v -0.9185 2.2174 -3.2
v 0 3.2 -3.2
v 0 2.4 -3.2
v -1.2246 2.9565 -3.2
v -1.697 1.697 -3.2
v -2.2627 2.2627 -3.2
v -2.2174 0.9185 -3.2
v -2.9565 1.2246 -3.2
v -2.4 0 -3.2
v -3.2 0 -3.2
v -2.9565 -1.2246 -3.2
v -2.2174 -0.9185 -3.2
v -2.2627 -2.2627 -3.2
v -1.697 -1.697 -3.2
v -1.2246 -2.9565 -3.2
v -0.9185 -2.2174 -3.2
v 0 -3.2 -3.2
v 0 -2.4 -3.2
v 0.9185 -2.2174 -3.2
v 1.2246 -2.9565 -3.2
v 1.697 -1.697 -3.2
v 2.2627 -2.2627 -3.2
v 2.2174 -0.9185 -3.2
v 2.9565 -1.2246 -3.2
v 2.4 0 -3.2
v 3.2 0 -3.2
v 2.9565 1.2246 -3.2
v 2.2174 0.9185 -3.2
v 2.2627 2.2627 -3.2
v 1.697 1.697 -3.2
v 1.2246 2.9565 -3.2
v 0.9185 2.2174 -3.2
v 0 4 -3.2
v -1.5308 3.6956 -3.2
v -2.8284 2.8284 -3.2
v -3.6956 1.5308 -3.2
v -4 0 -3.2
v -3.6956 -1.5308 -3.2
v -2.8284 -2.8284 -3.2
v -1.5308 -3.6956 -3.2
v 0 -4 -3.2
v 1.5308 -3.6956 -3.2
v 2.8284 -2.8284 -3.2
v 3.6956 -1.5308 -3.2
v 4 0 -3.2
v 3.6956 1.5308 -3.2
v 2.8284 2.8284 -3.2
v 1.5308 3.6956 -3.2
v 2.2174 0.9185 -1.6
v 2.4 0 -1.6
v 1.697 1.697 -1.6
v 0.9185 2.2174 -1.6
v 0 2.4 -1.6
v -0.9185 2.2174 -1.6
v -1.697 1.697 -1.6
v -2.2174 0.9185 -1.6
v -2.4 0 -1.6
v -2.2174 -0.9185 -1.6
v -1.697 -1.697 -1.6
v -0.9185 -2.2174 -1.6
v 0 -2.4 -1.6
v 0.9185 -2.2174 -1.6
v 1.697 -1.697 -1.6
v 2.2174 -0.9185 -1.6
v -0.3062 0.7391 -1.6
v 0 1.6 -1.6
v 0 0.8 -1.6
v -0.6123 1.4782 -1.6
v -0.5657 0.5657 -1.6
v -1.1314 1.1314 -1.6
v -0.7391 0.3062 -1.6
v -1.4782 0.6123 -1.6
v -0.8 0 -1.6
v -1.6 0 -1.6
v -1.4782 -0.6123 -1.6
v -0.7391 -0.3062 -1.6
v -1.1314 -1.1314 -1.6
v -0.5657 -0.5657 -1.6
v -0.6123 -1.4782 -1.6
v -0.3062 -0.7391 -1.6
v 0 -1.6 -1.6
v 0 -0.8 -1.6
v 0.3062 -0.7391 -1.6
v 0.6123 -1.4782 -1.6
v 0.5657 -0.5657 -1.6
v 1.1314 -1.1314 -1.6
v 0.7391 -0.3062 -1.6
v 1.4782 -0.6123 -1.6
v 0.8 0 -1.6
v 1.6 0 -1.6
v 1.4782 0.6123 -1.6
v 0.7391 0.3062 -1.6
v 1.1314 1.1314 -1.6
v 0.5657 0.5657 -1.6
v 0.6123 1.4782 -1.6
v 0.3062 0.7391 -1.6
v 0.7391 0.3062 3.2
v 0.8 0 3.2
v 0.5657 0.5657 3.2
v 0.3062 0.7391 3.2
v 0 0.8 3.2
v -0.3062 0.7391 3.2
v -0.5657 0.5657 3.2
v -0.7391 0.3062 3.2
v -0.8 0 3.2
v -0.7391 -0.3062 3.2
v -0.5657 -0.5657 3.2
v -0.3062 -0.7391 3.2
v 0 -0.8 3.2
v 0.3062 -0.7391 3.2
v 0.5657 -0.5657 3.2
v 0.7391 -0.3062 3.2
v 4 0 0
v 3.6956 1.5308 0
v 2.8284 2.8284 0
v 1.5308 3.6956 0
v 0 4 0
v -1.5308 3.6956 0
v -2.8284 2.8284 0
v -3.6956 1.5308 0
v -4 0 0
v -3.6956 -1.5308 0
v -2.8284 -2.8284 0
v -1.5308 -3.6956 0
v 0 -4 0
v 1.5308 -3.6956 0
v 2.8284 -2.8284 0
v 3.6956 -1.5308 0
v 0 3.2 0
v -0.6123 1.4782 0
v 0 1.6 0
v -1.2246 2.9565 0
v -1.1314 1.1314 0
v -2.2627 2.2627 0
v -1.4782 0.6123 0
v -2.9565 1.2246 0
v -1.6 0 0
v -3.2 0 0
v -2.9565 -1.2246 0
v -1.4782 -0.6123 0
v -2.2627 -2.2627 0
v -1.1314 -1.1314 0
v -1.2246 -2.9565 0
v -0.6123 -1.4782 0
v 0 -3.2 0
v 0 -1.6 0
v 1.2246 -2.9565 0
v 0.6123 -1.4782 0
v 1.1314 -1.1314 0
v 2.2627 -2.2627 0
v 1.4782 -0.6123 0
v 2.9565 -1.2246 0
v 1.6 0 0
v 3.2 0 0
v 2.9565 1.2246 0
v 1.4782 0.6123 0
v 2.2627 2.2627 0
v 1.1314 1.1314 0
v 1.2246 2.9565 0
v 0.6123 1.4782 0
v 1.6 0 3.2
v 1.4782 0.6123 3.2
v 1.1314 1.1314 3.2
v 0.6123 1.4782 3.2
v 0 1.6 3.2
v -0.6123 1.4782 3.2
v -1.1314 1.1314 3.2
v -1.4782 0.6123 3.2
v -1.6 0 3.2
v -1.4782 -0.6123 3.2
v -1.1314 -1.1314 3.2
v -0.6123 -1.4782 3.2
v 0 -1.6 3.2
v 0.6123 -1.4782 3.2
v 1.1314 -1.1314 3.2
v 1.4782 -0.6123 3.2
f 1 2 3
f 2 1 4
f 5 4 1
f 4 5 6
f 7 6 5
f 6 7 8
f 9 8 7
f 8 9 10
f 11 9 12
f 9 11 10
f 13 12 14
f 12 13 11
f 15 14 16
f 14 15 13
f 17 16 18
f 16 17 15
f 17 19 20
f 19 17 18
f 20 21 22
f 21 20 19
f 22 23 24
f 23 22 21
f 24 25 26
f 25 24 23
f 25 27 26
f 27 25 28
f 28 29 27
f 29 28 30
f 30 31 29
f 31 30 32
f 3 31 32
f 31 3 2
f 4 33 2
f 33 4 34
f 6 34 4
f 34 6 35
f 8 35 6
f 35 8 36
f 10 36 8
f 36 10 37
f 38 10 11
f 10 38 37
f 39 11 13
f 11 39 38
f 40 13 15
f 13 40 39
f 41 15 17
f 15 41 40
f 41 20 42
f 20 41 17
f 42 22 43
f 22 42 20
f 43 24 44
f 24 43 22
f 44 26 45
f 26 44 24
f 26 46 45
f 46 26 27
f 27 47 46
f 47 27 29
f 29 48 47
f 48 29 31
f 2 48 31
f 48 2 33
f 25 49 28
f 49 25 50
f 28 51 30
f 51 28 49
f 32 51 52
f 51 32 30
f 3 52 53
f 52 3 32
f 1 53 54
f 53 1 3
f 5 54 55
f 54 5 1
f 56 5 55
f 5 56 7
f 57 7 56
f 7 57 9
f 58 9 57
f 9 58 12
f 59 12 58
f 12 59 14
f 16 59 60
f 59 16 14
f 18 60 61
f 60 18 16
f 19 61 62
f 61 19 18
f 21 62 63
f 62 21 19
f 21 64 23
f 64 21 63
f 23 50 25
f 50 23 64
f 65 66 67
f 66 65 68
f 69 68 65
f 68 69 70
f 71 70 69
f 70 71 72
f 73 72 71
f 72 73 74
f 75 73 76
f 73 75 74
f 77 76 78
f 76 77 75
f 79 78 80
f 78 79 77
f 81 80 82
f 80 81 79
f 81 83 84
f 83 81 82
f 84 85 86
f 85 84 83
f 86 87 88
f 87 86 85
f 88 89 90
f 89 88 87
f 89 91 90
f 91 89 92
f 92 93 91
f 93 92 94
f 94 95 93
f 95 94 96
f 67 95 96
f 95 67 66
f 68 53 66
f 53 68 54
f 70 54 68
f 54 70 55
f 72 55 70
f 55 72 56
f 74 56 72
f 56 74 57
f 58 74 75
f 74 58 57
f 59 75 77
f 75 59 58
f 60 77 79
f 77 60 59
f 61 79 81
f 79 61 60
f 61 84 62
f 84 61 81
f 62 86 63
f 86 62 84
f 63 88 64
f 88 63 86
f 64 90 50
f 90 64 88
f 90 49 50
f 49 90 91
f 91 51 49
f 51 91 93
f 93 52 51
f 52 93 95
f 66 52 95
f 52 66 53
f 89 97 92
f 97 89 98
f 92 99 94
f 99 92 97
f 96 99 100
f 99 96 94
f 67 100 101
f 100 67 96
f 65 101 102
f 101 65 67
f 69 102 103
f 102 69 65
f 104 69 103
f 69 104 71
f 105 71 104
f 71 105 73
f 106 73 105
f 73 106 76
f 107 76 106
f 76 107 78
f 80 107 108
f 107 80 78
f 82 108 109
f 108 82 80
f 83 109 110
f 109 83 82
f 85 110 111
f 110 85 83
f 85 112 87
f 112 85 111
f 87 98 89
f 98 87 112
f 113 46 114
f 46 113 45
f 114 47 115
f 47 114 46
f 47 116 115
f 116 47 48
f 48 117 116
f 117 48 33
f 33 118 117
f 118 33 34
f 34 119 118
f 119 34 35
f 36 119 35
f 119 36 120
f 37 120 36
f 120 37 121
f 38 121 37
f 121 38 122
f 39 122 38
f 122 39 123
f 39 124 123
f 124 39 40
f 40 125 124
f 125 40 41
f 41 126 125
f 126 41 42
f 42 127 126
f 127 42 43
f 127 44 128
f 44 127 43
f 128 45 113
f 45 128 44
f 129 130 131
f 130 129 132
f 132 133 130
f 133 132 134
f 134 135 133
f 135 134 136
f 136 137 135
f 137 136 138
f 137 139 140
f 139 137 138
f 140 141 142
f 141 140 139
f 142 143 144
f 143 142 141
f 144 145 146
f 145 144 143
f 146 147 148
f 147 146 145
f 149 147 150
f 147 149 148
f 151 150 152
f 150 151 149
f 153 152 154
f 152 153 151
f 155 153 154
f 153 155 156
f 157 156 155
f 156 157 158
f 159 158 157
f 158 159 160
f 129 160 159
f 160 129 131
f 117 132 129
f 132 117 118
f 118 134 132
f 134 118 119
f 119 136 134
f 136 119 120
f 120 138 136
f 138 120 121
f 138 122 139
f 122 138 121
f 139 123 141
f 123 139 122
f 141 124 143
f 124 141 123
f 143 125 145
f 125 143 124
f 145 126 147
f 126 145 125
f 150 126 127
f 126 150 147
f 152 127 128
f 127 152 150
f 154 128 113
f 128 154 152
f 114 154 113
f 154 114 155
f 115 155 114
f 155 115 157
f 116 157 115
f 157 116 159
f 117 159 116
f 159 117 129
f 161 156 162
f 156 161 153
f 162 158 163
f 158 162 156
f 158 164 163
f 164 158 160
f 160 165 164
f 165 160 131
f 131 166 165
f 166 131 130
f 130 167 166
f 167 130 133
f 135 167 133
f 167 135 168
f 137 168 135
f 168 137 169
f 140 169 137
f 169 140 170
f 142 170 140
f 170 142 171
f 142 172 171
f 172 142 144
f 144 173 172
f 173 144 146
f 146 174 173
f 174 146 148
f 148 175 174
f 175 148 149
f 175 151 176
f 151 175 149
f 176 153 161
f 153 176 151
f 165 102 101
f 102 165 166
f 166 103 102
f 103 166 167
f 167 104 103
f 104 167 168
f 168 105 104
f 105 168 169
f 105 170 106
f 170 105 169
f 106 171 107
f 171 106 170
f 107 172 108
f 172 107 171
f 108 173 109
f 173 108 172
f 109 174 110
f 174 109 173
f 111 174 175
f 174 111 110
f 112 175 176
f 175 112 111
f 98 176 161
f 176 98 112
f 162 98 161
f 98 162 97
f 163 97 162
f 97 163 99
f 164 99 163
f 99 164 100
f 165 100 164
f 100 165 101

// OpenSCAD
// file: ../p/4-4edge.scad
use <../lib.scad>
function ldraw_lib__4_4edge() = [
// 0 Circle 1.0
// 0 Name: 4-4edge.dat
// 0 Author: James Jessiman
// 0 !LDRAW_ORG Primitive UPDATE 2017-01
// 0 !LICENSE Licensed under CC BY 4.0 : see CAreadme.txt
// 
// 0 BFC CERTIFY CCW
  [0,"BFC","CERTIFY"],
  [0,"BFC","CCW"],
// 
// 0 !HISTORY 1998-12-15 [PTadmin] Official Update 1998-10
// 0 !HISTORY 2005-12-28 [PTadmin] Official Update 2005-01
// 0 !HISTORY 2007-06-24 [PTadmin] Header formatted for Contributor Agreement
// 0 !HISTORY 2008-07-01 [PTadmin] Official Update 2008-01
// 0 !HISTORY 2017-01-15 [Steffen] BFCed
// 0 !HISTORY 2017-12-30 [PTadmin] Official Update 2017-01
// 
// 
// 2 24 1 0 0 0.9239 0 0.3827
  [2,24,1,0,0,0.9239,0,0.3827],
// 2 24 0.9239 0 0.3827 0.7071 0 0.7071
  [2,24,0.9239,0,0.3827,0.7071,0,0.7071],
// 2 24 0.7071 0 0.7071 0.3827 0 0.9239
  [2,24,0.7071,0,0.7071,0.3827,0,0.9239],
// 2 24 0.3827 0 0.9239 0 0 1
  [2,24,0.3827,0,0.9239,0,0,1],
// 2 24 0 0 1 -0.3827 0 0.9239
  [2,24,0,0,1,-0.3827,0,0.9239],
// 2 24 -0.3827 0 0.9239 -0.7071 0 0.7071
  [2,24,-0.3827,0,0.9239,-0.7071,0,0.7071],
// 2 24 -0.7071 0 0.7071 -0.9239 0 0.3827
  [2,24,-0.7071,0,0.7071,-0.9239,0,0.3827],
// 2 24 -0.9239 0 0.3827 -1 0 -0
  [2,24,-0.9239,0,0.3827,-1,0,-0],
// 2 24 -1 0 -0 -0.9239 0 -0.3827
  [2,24,-1,0,-0,-0.9239,0,-0.3827],
// 2 24 -0.9239 0 -0.3827 -0.7071 0 -0.7071
  [2,24,-0.9239,0,-0.3827,-0.7071,0,-0.7071],
// 2 24 -0.7071 0 -0.7071 -0.3827 0 -0.9239
  [2,24,-0.7071,0,-0.7071,-0.3827,0,-0.9239],
// 2 24 -0.3827 0 -0.9239 0 0 -1
  [2,24,-0.3827,0,-0.9239,0,0,-1],
// 2 24 0 0 -1 0.3827 0 -0.9239
  [2,24,0,0,-1,0.3827,0,-0.9239],
// 2 24 0.3827 0 -0.9239 0.7071 0 -0.7071
  [2,24,0.3827,0,-0.9239,0.7071,0,-0.7071],
// 2 24 0.7071 0 -0.7071 0.9239 0 -0.3827
  [2,24,0.7071,0,-0.7071,0.9239,0,-0.3827],
// 2 24 0.9239 0 -0.3827 1 0 0
  [2,24,0.9239,0,-0.3827,1,0,0],
];
module ldraw_lib__4_4edge(step=0, col=false, unit=2/5, alt=false, line=0.2, solid=!$preview)
    makepoly(ldraw_lib__4_4edge(), step=step, col=col, unit=unit, alt=alt, line=line, solid=solid);
ldraw_lib__4_4edge(line=0.2);
// file: ../p/4-4cyli.scad
use <../lib.scad>
function ldraw_lib__4_4cyli() = [
// 0 Cylinder 1.0
// 0 Name: 4-4cyli.dat
// 0 Author: James Jessiman
// 0 !LDRAW_ORG Primitive UPDATE 2005-01
// 0 !LICENSE Licensed under CC BY 2.0 and CC BY 4.0 : see CAreadme.txt
// 
// 0 BFC CERTIFY CCW
  [0,"BFC","CERTIFY"],
  [0,"BFC","CCW"],
// 
// 0 !HISTORY 1998-12-15 [PTadmin] Official Update 1998-10
// 0 !HISTORY 2002-03-23 [sbliss] Added BFC statement; merged headers from files in distributions LDraw 0.27 and Complete.
// 0 !HISTORY 2002-04-25 [PTadmin] Official Update 2002-02
// 0 !HISTORY 2004-12-14 [guyvivan] BFC CCW
// 0 !HISTORY 2005-12-28 [PTadmin] Official Update 2005-01
// 0 !HISTORY 2007-06-24 [PTadmin] Header formatted for Contributor Agreement
// 0 !HISTORY 2008-07-01 [PTadmin] Official Update 2008-01
// 
// 
// 4 16 1 1 0 0.9239 1 0.3827 0.9239 0 0.3827 1 0 0
  [4,16,1,1,0,0.9239,1,0.3827,0.9239,0,0.3827,1,0,0],
// 5 24 1 0 0 1 1 0 0.9239 0 0.3827 0.9239 0 -0.3827
  [5,24,1,0,0,1,1,0,0.9239,0,0.3827,0.9239,0,-0.3827],
// 4 16 0.9239 1 0.3827 0.7071 1 0.7071 0.7071 0 0.7071 0.9239 0 0.3827
  [4,16,0.9239,1,0.3827,0.7071,1,0.7071,0.7071,0,0.7071,0.9239,0,0.3827],
// 5 24 0.9239 0 0.3827 0.9239 1 0.3827 0.7071 0 0.7071 1 0 0
  [5,24,0.9239,0,0.3827,0.9239,1,0.3827,0.7071,0,0.7071,1,0,0],
// 4 16 0.7071 1 0.7071 0.3827 1 0.9239 0.3827 0 0.9239 0.7071 0 0.7071
  [4,16,0.7071,1,0.7071,0.3827,1,0.9239,0.3827,0,0.9239,0.7071,0,0.7071],
// 5 24 0.7071 0 0.7071 0.7071 1 0.7071 0.3827 0 0.9239 0.9239 0 0.3827
  [5,24,0.7071,0,0.7071,0.7071,1,0.7071,0.3827,0,0.9239,0.9239,0,0.3827],
// 4 16 0.3827 1 0.9239 0 1 1 0 0 1 0.3827 0 0.9239
  [4,16,0.3827,1,0.9239,0,1,1,0,0,1,0.3827,0,0.9239],
// 5 24 0.3827 0 0.9239 0.3827 1 0.9239 0 0 1 0.7071 0 0.7071
  [5,24,0.3827,0,0.9239,0.3827,1,0.9239,0,0,1,0.7071,0,0.7071],
// 4 16 0 1 1 -0.3827 1 0.9239 -0.3827 0 0.9239 0 0 1
  [4,16,0,1,1,-0.3827,1,0.9239,-0.3827,0,0.9239,0,0,1],
// 5 24 0 0 1 0 1 1 -0.3827 0 0.9239 0.3827 0 0.9239
  [5,24,0,0,1,0,1,1,-0.3827,0,0.9239,0.3827,0,0.9239],
// 4 16 -0.3827 1 0.9239 -0.7071 1 0.7071 -0.7071 0 0.7071 -0.3827 0 0.9239
  [4,16,-0.3827,1,0.9239,-0.7071,1,0.7071,-0.7071,0,0.7071,-0.3827,0,0.9239],
// 5 24 -0.3827 0 0.9239 -0.3827 1 0.9239 -0.7071 0 0.7071 0 0 1
  [5,24,-0.3827,0,0.9239,-0.3827,1,0.9239,-0.7071,0,0.7071,0,0,1],
// 4 16 -0.7071 1 0.7071 -0.9239 1 0.3827 -0.9239 0 0.3827 -0.7071 0 0.7071
  [4,16,-0.7071,1,0.7071,-0.9239,1,0.3827,-0.9239,0,0.3827,-0.7071,0,0.7071],
// 5 24 -0.7071 0 0.7071 -0.7071 1 0.7071 -0.9239 0 0.3827 -0.3827 0 0.9239
  [5,24,-0.7071,0,0.7071,-0.7071,1,0.7071,-0.9239,0,0.3827,-0.3827,0,0.9239],
// 4 16 -0.9239 1 0.3827 -1 1 0 -1 0 0 -0.9239 0 0.3827
  [4,16,-0.9239,1,0.3827,-1,1,0,-1,0,0,-0.9239,0,0.3827],
// 5 24 -0.9239 0 0.3827 -0.9239 1 0.3827 -1 0 0 -0.7071 0 0.7071
  [5,24,-0.9239,0,0.3827,-0.9239,1,0.3827,-1,0,0,-0.7071,0,0.7071],
// 4 16 -1 1 0 -0.9239 1 -0.3827 -0.9239 0 -0.3827 -1 0 0
  [4,16,-1,1,0,-0.9239,1,-0.3827,-0.9239,0,-0.3827,-1,0,0],
// 5 24 -1 0 0 -1 1 0 -0.9239 0 -0.3827 -0.9239 0 0.3827
  [5,24,-1,0,0,-1,1,0,-0.9239,0,-0.3827,-0.9239,0,0.3827],
// 4 16 -0.9239 1 -0.3827 -0.7071 1 -0.7071 -0.7071 0 -0.7071 -0.9239 0 -0.3827
  [4,16,-0.9239,1,-0.3827,-0.7071,1,-0.7071,-0.7071,0,-0.7071,-0.9239,0,-0.3827],
// 5 24 -0.9239 0 -0.3827 -0.9239 1 -0.3827 -0.7071 0 -0.7071 -1 0 0
  [5,24,-0.9239,0,-0.3827,-0.9239,1,-0.3827,-0.7071,0,-0.7071,-1,0,0],
// 4 16 -0.7071 1 -0.7071 -0.3827 1 -0.9239 -0.3827 0 -0.9239 -0.7071 0 -0.7071
  [4,16,-0.7071,1,-0.7071,-0.3827,1,-0.9239,-0.3827,0,-0.9239,-0.7071,0,-0.7071],
// 5 24 -0.7071 0 -0.7071 -0.7071 1 -0.7071 -0.3827 0 -0.9239 -0.9239 0 -0.3827
  [5,24,-0.7071,0,-0.7071,-0.7071,1,-0.7071,-0.3827,0,-0.9239,-0.9239,0,-0.3827],
// 4 16 -0.3827 1 -0.9239 0 1 -1 0 0 -1 -0.3827 0 -0.9239
  [4,16,-0.3827,1,-0.9239,0,1,-1,0,0,-1,-0.3827,0,-0.9239],
// 5 24 -0.3827 0 -0.9239 -0.3827 1 -0.9239 0 0 -1 -0.7071 0 -0.7071
  [5,24,-0.3827,0,-0.9239,-0.3827,1,-0.9239,0,0,-1,-0.7071,0,-0.7071],
// 4 16 0 1 -1 0.3827 1 -0.9239 0.3827 0 -0.9239 0 0 -1
  [4,16,0,1,-1,0.3827,1,-0.9239,0.3827,0,-0.9239,0,0,-1],
// 5 24 0 0 -1 0 1 -1 0.3827 0 -0.9239 -0.3827 0 -0.9239
  [5,24,0,0,-1,0,1,-1,0.3827,0,-0.9239,-0.3827,0,-0.9239],
// 4 16 0.3827 1 -0.9239 0.7071 1 -0.7071 0.7071 0 -0.7071 0.3827 0 -0.9239
  [4,16,0.3827,1,-0.9239,0.7071,1,-0.7071,0.7071,0,-0.7071,0.3827,0,-0.9239],
// 5 24 0.3827 0 -0.9239 0.3827 1 -0.9239 0.7071 0 -0.7071 0 0 -1
  [5,24,0.3827,0,-0.9239,0.3827,1,-0.9239,0.7071,0,-0.7071,0,0,-1],
// 4 16 0.7071 1 -0.7071 0.9239 1 -0.3827 0.9239 0 -0.3827 0.7071 0 -0.7071
  [4,16,0.7071,1,-0.7071,0.9239,1,-0.3827,0.9239,0,-0.3827,0.7071,0,-0.7071],
// 5 24 0.7071 0 -0.7071 0.7071 1 -0.7071 0.9239 0 -0.3827 0.3827 0 -0.9239
  [5,24,0.7071,0,-0.7071,0.7071,1,-0.7071,0.9239,0,-0.3827,0.3827,0,-0.9239],
// 4 16 0.9239 1 -0.3827 1 1 0 1 0 0 0.9239 0 -0.3827
  [4,16,0.9239,1,-0.3827,1,1,0,1,0,0,0.9239,0,-0.3827],
// 5 24 0.9239 0 -0.3827 0.9239 1 -0.3827 1 0 0 0.7071 0 -0.7071
  [5,24,0.9239,0,-0.3827,0.9239,1,-0.3827,1,0,0,0.7071,0,-0.7071],
// 0
];
module ldraw_lib__4_4cyli(step=0, col=false, unit=2/5, alt=false, line=0.2, solid=!$preview)
    makepoly(ldraw_lib__4_4cyli(), step=step, col=col, unit=unit, alt=alt, line=line, solid=solid);
ldraw_lib__4_4cyli(line=0.2);
// file: ../p/4-4ring4.scad
use <../lib.scad>
function ldraw_lib__4_4ring4() = [
// 0 Ring  4 x 1.0
// 0 Name: 4-4ring4.dat
// 0 Author: James Jessiman
// 0 !LDRAW_ORG Primitive UPDATE 2009-01
// 0 !LICENSE Licensed under CC BY 2.0 and CC BY 4.0 : see CAreadme.txt
// 
// 0 BFC CERTIFY CCW
  [0,"BFC","CERTIFY"],
  [0,"BFC","CCW"],
// 
// 0 !HISTORY 1998-12-15 [PTadmin] Official Update 1998-10
// 0 !HISTORY 2002-04-08 [BrickCaster] Modified for BFC compliance
// 0 !HISTORY 2002-04-25 [PTadmin] Official Update 2002-02
// 0 !HISTORY 2007-06-24 [PTadmin] Header formatted for Contributor Agreement
// 0 !HISTORY 2008-07-01 [PTadmin] Official Update 2008-01
// 0 !HISTORY 2008-08-26 [cwdee] Switch polygon winding and rename
// 0 !HISTORY 2009-05-02 [PTadmin] Official Update 2009-01
// 
// 
// 4 16 -1.9135 0 4.6195 -1.5308 0 3.6956 0 0 4 0 0 5
  [4,16,-1.9135,0,4.6195,-1.5308,0,3.6956,0,0,4,0,0,5],
// 4 16 -3.5355 0 3.5355 -2.8284 0 2.8284 -1.5308 0 3.6956 -1.9135 0 4.6195
  [4,16,-3.5355,0,3.5355,-2.8284,0,2.8284,-1.5308,0,3.6956,-1.9135,0,4.6195],
// 4 16 -4.6195 0 1.9135 -3.6956 0 1.5308 -2.8284 0 2.8284 -3.5355 0 3.5355
  [4,16,-4.6195,0,1.9135,-3.6956,0,1.5308,-2.8284,0,2.8284,-3.5355,0,3.5355],
// 4 16 -5 0 0 -4 0 0 -3.6956 0 1.5308 -4.6195 0 1.9135
  [4,16,-5,0,0,-4,0,0,-3.6956,0,1.5308,-4.6195,0,1.9135],
// 4 16 -4.6195 0 -1.9135 -3.6956 0 -1.5308 -4 0 0 -5 0 0
  [4,16,-4.6195,0,-1.9135,-3.6956,0,-1.5308,-4,0,0,-5,0,0],
// 4 16 -3.5355 0 -3.5355 -2.8284 0 -2.8284 -3.6956 0 -1.5308 -4.6195 0 -1.9135
  [4,16,-3.5355,0,-3.5355,-2.8284,0,-2.8284,-3.6956,0,-1.5308,-4.6195,0,-1.9135],
// 4 16 -1.9135 0 -4.6195 -1.5308 0 -3.6956 -2.8284 0 -2.8284 -3.5355 0 -3.5355
  [4,16,-1.9135,0,-4.6195,-1.5308,0,-3.6956,-2.8284,0,-2.8284,-3.5355,0,-3.5355],
// 4 16 0 0 -5 0 0 -4 -1.5308 0 -3.6956 -1.9135 0 -4.6195
  [4,16,0,0,-5,0,0,-4,-1.5308,0,-3.6956,-1.9135,0,-4.6195],
// 4 16 1.9135 0 -4.6195 1.5308 0 -3.6956 0 0 -4 0 0 -5
  [4,16,1.9135,0,-4.6195,1.5308,0,-3.6956,0,0,-4,0,0,-5],
// 4 16 3.5355 0 -3.5355 2.8284 0 -2.8284 1.5308 0 -3.6956 1.9135 0 -4.6195
  [4,16,3.5355,0,-3.5355,2.8284,0,-2.8284,1.5308,0,-3.6956,1.9135,0,-4.6195],
// 4 16 4.6195 0 -1.9135 3.6956 0 -1.5308 2.8284 0 -2.8284 3.5355 0 -3.5355
  [4,16,4.6195,0,-1.9135,3.6956,0,-1.5308,2.8284,0,-2.8284,3.5355,0,-3.5355],
// 4 16 5 0 0 4 0 0 3.6956 0 -1.5308 4.6195 0 -1.9135
  [4,16,5,0,0,4,0,0,3.6956,0,-1.5308,4.6195,0,-1.9135],
// 4 16 4.6195 0 1.9135 3.6956 0 1.5308 4 0 0 5 0 0
  [4,16,4.6195,0,1.9135,3.6956,0,1.5308,4,0,0,5,0,0],
// 4 16 3.5355 0 3.5355 2.8284 0 2.8284 3.6956 0 1.5308 4.6195 0 1.9135
  [4,16,3.5355,0,3.5355,2.8284,0,2.8284,3.6956,0,1.5308,4.6195,0,1.9135],
// 4 16 1.9135 0 4.6195 1.5308 0 3.6956 2.8284 0 2.8284 3.5355 0 3.5355
  [4,16,1.9135,0,4.6195,1.5308,0,3.6956,2.8284,0,2.8284,3.5355,0,3.5355],
// 4 16 0 0 5 0 0 4 1.5308 0 3.6956 1.9135 0 4.6195
  [4,16,0,0,5,0,0,4,1.5308,0,3.6956,1.9135,0,4.6195],
// 0
];
module ldraw_lib__4_4ring4(step=0, col=false, unit=2/5, alt=false, line=0.2, solid=!$preview)
    makepoly(ldraw_lib__4_4ring4(), step=step, col=col, unit=unit, alt=alt, line=line, solid=solid);
ldraw_lib__4_4ring4(line=0.2);
// file: ../p/4-4ring3.scad
use <../lib.scad>
function ldraw_lib__4_4ring3() = [
// 0 Ring  3 x 1.0
// 0 Name: 4-4ring3.dat
// 0 Author: James Jessiman
// 0 !LDRAW_ORG Primitive UPDATE 2009-01
// 0 !LICENSE Licensed under CC BY 2.0 and CC BY 4.0 : see CAreadme.txt
// 
// 0 BFC CERTIFY CCW
  [0,"BFC","CERTIFY"],
  [0,"BFC","CCW"],
// 
// 0 !HISTORY 1998-12-15 [PTadmin] Official Update 1998-10
// 0 !HISTORY 2002-04-05 [hafhead] Added BFC statement
// 0 !HISTORY 2002-04-25 [PTadmin] Official Update 2002-02
// 0 !HISTORY 2007-06-24 [PTadmin] Header formatted for Contributor Agreement
// 0 !HISTORY 2008-07-01 [PTadmin] Official Update 2008-01
// 0 !HISTORY 2008-08-26 [cwdee] Switch polygon winding and rename
// 0 !HISTORY 2009-05-02 [PTadmin] Official Update 2009-01
// 
// 
// 4 16 -1.5308 0 3.6956 -1.1481 0 2.7717 0 0 3 0 0 4
  [4,16,-1.5308,0,3.6956,-1.1481,0,2.7717,0,0,3,0,0,4],
// 4 16 -2.8284 0 2.8284 -2.1213 0 2.1213 -1.1481 0 2.7717 -1.5308 0 3.6956
  [4,16,-2.8284,0,2.8284,-2.1213,0,2.1213,-1.1481,0,2.7717,-1.5308,0,3.6956],
// 4 16 -3.6956 0 1.5308 -2.7717 0 1.1481 -2.1213 0 2.1213 -2.8284 0 2.8284
  [4,16,-3.6956,0,1.5308,-2.7717,0,1.1481,-2.1213,0,2.1213,-2.8284,0,2.8284],
// 4 16 -4 0 0 -3 0 0 -2.7717 0 1.1481 -3.6956 0 1.5308
  [4,16,-4,0,0,-3,0,0,-2.7717,0,1.1481,-3.6956,0,1.5308],
// 4 16 -3.6956 0 -1.5308 -2.7717 0 -1.1481 -3 0 0 -4 0 0
  [4,16,-3.6956,0,-1.5308,-2.7717,0,-1.1481,-3,0,0,-4,0,0],
// 4 16 -2.8284 0 -2.8284 -2.1213 0 -2.1213 -2.7717 0 -1.1481 -3.6956 0 -1.5308
  [4,16,-2.8284,0,-2.8284,-2.1213,0,-2.1213,-2.7717,0,-1.1481,-3.6956,0,-1.5308],
// 4 16 -1.5308 0 -3.6956 -1.1481 0 -2.7717 -2.1213 0 -2.1213 -2.8284 0 -2.8284
  [4,16,-1.5308,0,-3.6956,-1.1481,0,-2.7717,-2.1213,0,-2.1213,-2.8284,0,-2.8284],
// 4 16 0 0 -4 0 0 -3 -1.1481 0 -2.7717 -1.5308 0 -3.6956
  [4,16,0,0,-4,0,0,-3,-1.1481,0,-2.7717,-1.5308,0,-3.6956],
// 4 16 1.5308 0 -3.6956 1.1481 0 -2.7717 0 0 -3 0 0 -4
  [4,16,1.5308,0,-3.6956,1.1481,0,-2.7717,0,0,-3,0,0,-4],
// 4 16 2.8284 0 -2.8284 2.1213 0 -2.1213 1.1481 0 -2.7717 1.5308 0 -3.6956
  [4,16,2.8284,0,-2.8284,2.1213,0,-2.1213,1.1481,0,-2.7717,1.5308,0,-3.6956],
// 4 16 3.6956 0 -1.5308 2.7717 0 -1.1481 2.1213 0 -2.1213 2.8284 0 -2.8284
  [4,16,3.6956,0,-1.5308,2.7717,0,-1.1481,2.1213,0,-2.1213,2.8284,0,-2.8284],
// 4 16 4 0 0 3 0 0 2.7717 0 -1.1481 3.6956 0 -1.5308
  [4,16,4,0,0,3,0,0,2.7717,0,-1.1481,3.6956,0,-1.5308],
// 4 16 3.6956 0 1.5308 2.7717 0 1.1481 3 0 0 4 0 0
  [4,16,3.6956,0,1.5308,2.7717,0,1.1481,3,0,0,4,0,0],
// 4 16 2.8284 0 2.8284 2.1213 0 2.1213 2.7717 0 1.1481 3.6956 0 1.5308
  [4,16,2.8284,0,2.8284,2.1213,0,2.1213,2.7717,0,1.1481,3.6956,0,1.5308],
// 4 16 1.5308 0 3.6956 1.1481 0 2.7717 2.1213 0 2.1213 2.8284 0 2.8284
  [4,16,1.5308,0,3.6956,1.1481,0,2.7717,2.1213,0,2.1213,2.8284,0,2.8284],
// 4 16 0 0 4 0 0 3 1.1481 0 2.7717 1.5308 0 3.6956
  [4,16,0,0,4,0,0,3,1.1481,0,2.7717,1.5308,0,3.6956],
// 0
];
module ldraw_lib__4_4ring3(step=0, col=false, unit=2/5, alt=false, line=0.2, solid=!$preview)
    makepoly(ldraw_lib__4_4ring3(), step=step, col=col, unit=unit, alt=alt, line=line, solid=solid);
ldraw_lib__4_4ring3(line=0.2);
// file: ../p/4-4ring2.scad
use <../lib.scad>
function ldraw_lib__4_4ring2() = [
// 0 Ring  2 x 1.0
// 0 Name: 4-4ring2.dat
// 0 Author: James Jessiman
// 0 !LDRAW_ORG Primitive UPDATE 2009-01
// 0 !LICENSE Licensed under CC BY 2.0 and CC BY 4.0 : see CAreadme.txt
// 
// 0 BFC CERTIFY CCW
  [0,"BFC","CERTIFY"],
  [0,"BFC","CCW"],
// 
// 0 !HISTORY 1998-12-15 [PTadmin] Official Update 1998-10
// 0 !HISTORY 2002-04-05 [hafhead] Added BFC statement
// 0 !HISTORY 2002-04-25 [PTadmin] Official Update 2002-02
// 0 !HISTORY 2007-06-24 [PTadmin] Header formatted for Contributor Agreement
// 0 !HISTORY 2008-07-01 [PTadmin] Official Update 2008-01
// 0 !HISTORY 2008-08-26 [cwdee] Switch polygon winding and rename
// 0 !HISTORY 2009-05-02 [PTadmin] Official Update 2009-01
// 
// 
// 4 16 -1.1481 0 2.7717 -0.7654 0 1.8478 0 0 2 0 0 3
  [4,16,-1.1481,0,2.7717,-0.7654,0,1.8478,0,0,2,0,0,3],
// 4 16 -2.1213 0 2.1213 -1.4142 0 1.4142 -0.7654 0 1.8478 -1.1481 0 2.7717
  [4,16,-2.1213,0,2.1213,-1.4142,0,1.4142,-0.7654,0,1.8478,-1.1481,0,2.7717],
// 4 16 -2.7717 0 1.1481 -1.8478 0 0.7654 -1.4142 0 1.4142 -2.1213 0 2.1213
  [4,16,-2.7717,0,1.1481,-1.8478,0,0.7654,-1.4142,0,1.4142,-2.1213,0,2.1213],
// 4 16 -3 0 0 -2 0 0 -1.8478 0 0.7654 -2.7717 0 1.1481
  [4,16,-3,0,0,-2,0,0,-1.8478,0,0.7654,-2.7717,0,1.1481],
// 4 16 -2.7717 0 -1.1481 -1.8478 0 -0.7654 -2 0 0 -3 0 0
  [4,16,-2.7717,0,-1.1481,-1.8478,0,-0.7654,-2,0,0,-3,0,0],
// 4 16 -2.1213 0 -2.1213 -1.4142 0 -1.4142 -1.8478 0 -0.7654 -2.7717 0 -1.1481
  [4,16,-2.1213,0,-2.1213,-1.4142,0,-1.4142,-1.8478,0,-0.7654,-2.7717,0,-1.1481],
// 4 16 -1.1481 0 -2.7717 -0.7654 0 -1.8478 -1.4142 0 -1.4142 -2.1213 0 -2.1213
  [4,16,-1.1481,0,-2.7717,-0.7654,0,-1.8478,-1.4142,0,-1.4142,-2.1213,0,-2.1213],
// 4 16 0 0 -3 0 0 -2 -0.7654 0 -1.8478 -1.1481 0 -2.7717
  [4,16,0,0,-3,0,0,-2,-0.7654,0,-1.8478,-1.1481,0,-2.7717],
// 4 16 1.1481 0 -2.7717 0.7654 0 -1.8478 0 0 -2 0 0 -3
  [4,16,1.1481,0,-2.7717,0.7654,0,-1.8478,0,0,-2,0,0,-3],
// 4 16 2.1213 0 -2.1213 1.4142 0 -1.4142 0.7654 0 -1.8478 1.1481 0 -2.7717
  [4,16,2.1213,0,-2.1213,1.4142,0,-1.4142,0.7654,0,-1.8478,1.1481,0,-2.7717],
// 4 16 2.7717 0 -1.1481 1.8478 0 -0.7654 1.4142 0 -1.4142 2.1213 0 -2.1213
  [4,16,2.7717,0,-1.1481,1.8478,0,-0.7654,1.4142,0,-1.4142,2.1213,0,-2.1213],
// 4 16 3 0 0 2 0 0 1.8478 0 -0.7654 2.7717 0 -1.1481
  [4,16,3,0,0,2,0,0,1.8478,0,-0.7654,2.7717,0,-1.1481],
// 4 16 2.7717 0 1.1481 1.8478 0 0.7654 2 0 0 3 0 0
  [4,16,2.7717,0,1.1481,1.8478,0,0.7654,2,0,0,3,0,0],
// 4 16 2.1213 0 2.1213 1.4142 0 1.4142 1.8478 0 0.7654 2.7717 0 1.1481
  [4,16,2.1213,0,2.1213,1.4142,0,1.4142,1.8478,0,0.7654,2.7717,0,1.1481],
// 4 16 1.1481 0 2.7717 0.7654 0 1.8478 1.4142 0 1.4142 2.1213 0 2.1213
  [4,16,1.1481,0,2.7717,0.7654,0,1.8478,1.4142,0,1.4142,2.1213,0,2.1213],
// 4 16 0 0 3 0 0 2 0.7654 0 1.8478 1.1481 0 2.7717
  [4,16,0,0,3,0,0,2,0.7654,0,1.8478,1.1481,0,2.7717],
// 0
];
module ldraw_lib__4_4ring2(step=0, col=false, unit=2/5, alt=false, line=0.2, solid=!$preview)
    makepoly(ldraw_lib__4_4ring2(), step=step, col=col, unit=unit, alt=alt, line=line, solid=solid);
ldraw_lib__4_4ring2(line=0.2);
// file: ../p/4-4ring1.scad
use <../lib.scad>
function ldraw_lib__4_4ring1() = [
// 0 Ring  1 x 1.0
// 0 Name: 4-4ring1.dat
// 0 Author: James Jessiman
// 0 !LDRAW_ORG Primitive UPDATE 2009-01
// 0 !LICENSE Licensed under CC BY 2.0 and CC BY 4.0 : see CAreadme.txt
// 
// 0 BFC CERTIFY CCW
  [0,"BFC","CERTIFY"],
  [0,"BFC","CCW"],
// 
// 0 !HISTORY 1998-12-15 [PTadmin] Official Update 1998-10
// 0 !HISTORY 2002-04-08 [BrickCaster] Modified for BFC compliance
// 0 !HISTORY 2002-04-25 [PTadmin] Official Update 2002-02
// 0 !HISTORY 2007-06-24 [PTadmin] Header formatted for Contributor Agreement
// 0 !HISTORY 2008-07-01 [PTadmin] Official Update 2008-01
// 0 !HISTORY 2008-08-26 [cwdee] Switch polygon winding and rename
// 0 !HISTORY 2009-05-02 [PTadmin] Official Update 2009-01
// 
// 
// 4 16 -0.7654 0 1.8478 -0.3827 0 0.9239 0 0 1 0 0 2
  [4,16,-0.7654,0,1.8478,-0.3827,0,0.9239,0,0,1,0,0,2],
// 4 16 -1.4142 0 1.4142 -0.7071 0 0.7071 -0.3827 0 0.9239 -0.7654 0 1.8478
  [4,16,-1.4142,0,1.4142,-0.7071,0,0.7071,-0.3827,0,0.9239,-0.7654,0,1.8478],
// 4 16 -1.8478 0 0.7654 -0.9239 0 0.3827 -0.7071 0 0.7071 -1.4142 0 1.41420
  [4,16,-1.8478,0,0.7654,-0.9239,0,0.3827,-0.7071,0,0.7071,-1.4142,0,1.41420],
// 4 16 -2 0 0 -1 0 0 -0.9239 0 0.3827 -1.8478 0 0.7654
  [4,16,-2,0,0,-1,0,0,-0.9239,0,0.3827,-1.8478,0,0.7654],
// 4 16 -1.8478 0 -0.7654 -0.9239 0 -0.3827 -1 0 0 -2 0 0
  [4,16,-1.8478,0,-0.7654,-0.9239,0,-0.3827,-1,0,0,-2,0,0],
// 4 16 -1.4142 0 -1.4142 -0.7071 0 -0.7071 -0.9239 0 -0.3827 -1.8478 0 -0.7654
  [4,16,-1.4142,0,-1.4142,-0.7071,0,-0.7071,-0.9239,0,-0.3827,-1.8478,0,-0.7654],
// 4 16 -0.7654 0 -1.8478 -0.3827 0 -0.9239 -0.7071 0 -0.7071 -1.4142 0 -1.4142
  [4,16,-0.7654,0,-1.8478,-0.3827,0,-0.9239,-0.7071,0,-0.7071,-1.4142,0,-1.4142],
// 4 16 0 0 -2 0 0 -1 -0.3827 0 -0.9239 -0.7654 0 -1.8478
  [4,16,0,0,-2,0,0,-1,-0.3827,0,-0.9239,-0.7654,0,-1.8478],
// 4 16 0.7654 0 -1.8478 0.3827 0 -0.9239 0 0 -1 0 0 -2
  [4,16,0.7654,0,-1.8478,0.3827,0,-0.9239,0,0,-1,0,0,-2],
// 4 16 1.4142 0 -1.4142 0.7071 0 -0.7071 0.3827 0 -0.9239 0.7654 0 -1.8478
  [4,16,1.4142,0,-1.4142,0.7071,0,-0.7071,0.3827,0,-0.9239,0.7654,0,-1.8478],
// 4 16 1.8478 0 -0.7654 0.9239 0 -0.3827 0.7071 0 -0.7071 1.4142 0 -1.4142
  [4,16,1.8478,0,-0.7654,0.9239,0,-0.3827,0.7071,0,-0.7071,1.4142,0,-1.4142],
// 4 16 2 0 0 1 0 0 0.9239 0 -0.3827 1.8478 0 -0.7654
  [4,16,2,0,0,1,0,0,0.9239,0,-0.3827,1.8478,0,-0.7654],
// 4 16 1.8478 0 0.7654 0.9239 0 0.3827 1 0 0 2 0 0
  [4,16,1.8478,0,0.7654,0.9239,0,0.3827,1,0,0,2,0,0],
// 4 16 1.4142 0 1.4142 0.7071 0 0.7071 0.9239 0 0.3827 1.8478 0 0.7654
  [4,16,1.4142,0,1.4142,0.7071,0,0.7071,0.9239,0,0.3827,1.8478,0,0.7654],
// 4 16 0.7654 0 1.8478 0.3827 0 0.9239 0.7071 0 0.7071 1.4142 0 1.4142
  [4,16,0.7654,0,1.8478,0.3827,0,0.9239,0.7071,0,0.7071,1.4142,0,1.4142],
// 4 16 0 0 2 0 0 1 0.3827 0 0.9239 0.7654 0 1.8478
  [4,16,0,0,2,0,0,1,0.3827,0,0.9239,0.7654,0,1.8478],
// 0
];
module ldraw_lib__4_4ring1(step=0, col=false, unit=2/5, alt=false, line=0.2, solid=!$preview)
    makepoly(ldraw_lib__4_4ring1(), step=step, col=col, unit=unit, alt=alt, line=line, solid=solid);
ldraw_lib__4_4ring1(line=0.2);
// file: ../p/4-4cylo.scad
use <../lib.scad>
use <4-4cyli.scad>
use <4-4edge.scad>
function ldraw_lib__4_4cylo() = [
// 0 Cylinder Open 1.0
// 0 Name: 4-4cylo.dat
// 0 Author: Mark Kennedy [mkennedy]
// 0 !LDRAW_ORG Primitive UPDATE 2010-01
// 0 !LICENSE Licensed under CC BY 4.0 : see CAreadme.txt
// 
// 0 BFC CERTIFY CCW
  [0,"BFC","CERTIFY"],
  [0,"BFC","CCW"],
// 
// 0 !HISTORY 2010-04-05 [PTadmin] Official Update 2010-01
// 
// 
// 1 16 0 0 0 1 0 0 0 1 0 0 0 1 4-4edge.dat
  [1,16,0,0,0,1,0,0,0,1,0,0,0,1, ldraw_lib__4_4edge()],
// 1 16 0 1 0 1 0 0 0 1 0 0 0 1 4-4edge.dat
  [1,16,0,1,0,1,0,0,0,1,0,0,0,1, ldraw_lib__4_4edge()],
// 1 16 0 0 0 1 0 0 0 1 0 0 0 1 4-4cyli.dat
  [1,16,0,0,0,1,0,0,0,1,0,0,0,1, ldraw_lib__4_4cyli()],
// 0
];
module ldraw_lib__4_4cylo(step=0, col=false, unit=2/5, alt=false, line=0.2, solid=!$preview)
    makepoly(ldraw_lib__4_4cylo(), step=step, col=col, unit=unit, alt=alt, line=line, solid=solid);
ldraw_lib__4_4cylo(line=0.2);
// main file
use <../lib.scad>
use <../p/4-4cylo.scad>
use <../p/4-4ring1.scad>
use <../p/4-4ring2.scad>
use <../p/4-4ring3.scad>
use <../p/4-4ring4.scad>
function ldraw_lib__20482() = [
// 0 Tile  1 x  1 Round with Pin and Pin Hole
// 0 Name: 20482.dat
// 0 Author: Gerald Lasser [GeraldLasser]
// 0 !LDRAW_ORG Part UPDATE 2015-01
// 0 !LICENSE Licensed under CC BY 4.0 : see CAreadme.txt
// 
// 0 !HELP Holder for 2 LDU wide Stalks
// 
// 0 BFC CERTIFY CCW
  [0,"BFC","CERTIFY"],
  [0,"BFC","CCW"],
// 
// 0 !KEYWORDS Friends
// 
// 0 !HISTORY 2015-10-11 [PTadmin] Official Update 2015-01
// 
// 
// 1 16 0 8 0 2 0 0 0 -1 0 0 0 2 4-4ring3.dat
  [1,16,0,8,0,2,0,0,0,-1,0,0,0,2, ldraw_lib__4_4ring3()],
// 1 16 0 8 0 2 0 0 0 -1 0 0 0 2 4-4ring4.dat
  [1,16,0,8,0,2,0,0,0,-1,0,0,0,2, ldraw_lib__4_4ring4()],
// 0 BFC INVERTNEXT
  [0,"BFC","INVERTNEXT"],
// 1 16 0 4 0 6 0 0 0 4 0 0 0 6 4-4cylo.dat
  [1,16,0,4,0,6,0,0,0,4,0,0,0,6, ldraw_lib__4_4cylo()],
// 1 16 0 4 0 2 0 0 0 -1 0 0 0 2 4-4ring1.dat
  [1,16,0,4,0,2,0,0,0,-1,0,0,0,2, ldraw_lib__4_4ring1()],
// 1 16 0 4 0 2 0 0 0 -1 0 0 0 2 4-4ring2.dat
  [1,16,0,4,0,2,0,0,0,-1,0,0,0,2, ldraw_lib__4_4ring2()],
// 0 BFC INVERTNEXT
  [0,"BFC","INVERTNEXT"],
// 1 16 0 -8 0 2 0 0 0 12 0 0 0 2 4-4cylo.dat
  [1,16,0,-8,0,2,0,0,0,12,0,0,0,2, ldraw_lib__4_4cylo()],
// 1 16 0 0 0 10 0 0 0 8 0 0 0 10 4-4cylo.dat
  [1,16,0,0,0,10,0,0,0,8,0,0,0,10, ldraw_lib__4_4cylo()],
// 1 16 0 0 0 4 0 0 0 1 0 0 0 4 4-4ring1.dat
  [1,16,0,0,0,4,0,0,0,1,0,0,0,4, ldraw_lib__4_4ring1()],
// 1 16 0 0 0 2 0 0 0 1 0 0 0 2 4-4ring4.dat
  [1,16,0,0,0,2,0,0,0,1,0,0,0,2, ldraw_lib__4_4ring4()],
// 1 16 0 -8 0 4 0 0 0 8 0 0 0 4 4-4cylo.dat
  [1,16,0,-8,0,4,0,0,0,8,0,0,0,4, ldraw_lib__4_4cylo()],
// 1 16 0 -8 0 2 0 0 0 1 0 0 0 2 4-4ring1.dat
  [1,16,0,-8,0,2,0,0,0,1,0,0,0,2, ldraw_lib__4_4ring1()],
];
module ldraw_lib__20482(step=0, col=false, unit=2/5, alt=false, line=0.2, solid=!$preview)
    makepoly(ldraw_lib__20482(), step=step, col=col, unit=unit, alt=alt, line=line, solid=solid);
ldraw_lib__20482(line=0.2);
